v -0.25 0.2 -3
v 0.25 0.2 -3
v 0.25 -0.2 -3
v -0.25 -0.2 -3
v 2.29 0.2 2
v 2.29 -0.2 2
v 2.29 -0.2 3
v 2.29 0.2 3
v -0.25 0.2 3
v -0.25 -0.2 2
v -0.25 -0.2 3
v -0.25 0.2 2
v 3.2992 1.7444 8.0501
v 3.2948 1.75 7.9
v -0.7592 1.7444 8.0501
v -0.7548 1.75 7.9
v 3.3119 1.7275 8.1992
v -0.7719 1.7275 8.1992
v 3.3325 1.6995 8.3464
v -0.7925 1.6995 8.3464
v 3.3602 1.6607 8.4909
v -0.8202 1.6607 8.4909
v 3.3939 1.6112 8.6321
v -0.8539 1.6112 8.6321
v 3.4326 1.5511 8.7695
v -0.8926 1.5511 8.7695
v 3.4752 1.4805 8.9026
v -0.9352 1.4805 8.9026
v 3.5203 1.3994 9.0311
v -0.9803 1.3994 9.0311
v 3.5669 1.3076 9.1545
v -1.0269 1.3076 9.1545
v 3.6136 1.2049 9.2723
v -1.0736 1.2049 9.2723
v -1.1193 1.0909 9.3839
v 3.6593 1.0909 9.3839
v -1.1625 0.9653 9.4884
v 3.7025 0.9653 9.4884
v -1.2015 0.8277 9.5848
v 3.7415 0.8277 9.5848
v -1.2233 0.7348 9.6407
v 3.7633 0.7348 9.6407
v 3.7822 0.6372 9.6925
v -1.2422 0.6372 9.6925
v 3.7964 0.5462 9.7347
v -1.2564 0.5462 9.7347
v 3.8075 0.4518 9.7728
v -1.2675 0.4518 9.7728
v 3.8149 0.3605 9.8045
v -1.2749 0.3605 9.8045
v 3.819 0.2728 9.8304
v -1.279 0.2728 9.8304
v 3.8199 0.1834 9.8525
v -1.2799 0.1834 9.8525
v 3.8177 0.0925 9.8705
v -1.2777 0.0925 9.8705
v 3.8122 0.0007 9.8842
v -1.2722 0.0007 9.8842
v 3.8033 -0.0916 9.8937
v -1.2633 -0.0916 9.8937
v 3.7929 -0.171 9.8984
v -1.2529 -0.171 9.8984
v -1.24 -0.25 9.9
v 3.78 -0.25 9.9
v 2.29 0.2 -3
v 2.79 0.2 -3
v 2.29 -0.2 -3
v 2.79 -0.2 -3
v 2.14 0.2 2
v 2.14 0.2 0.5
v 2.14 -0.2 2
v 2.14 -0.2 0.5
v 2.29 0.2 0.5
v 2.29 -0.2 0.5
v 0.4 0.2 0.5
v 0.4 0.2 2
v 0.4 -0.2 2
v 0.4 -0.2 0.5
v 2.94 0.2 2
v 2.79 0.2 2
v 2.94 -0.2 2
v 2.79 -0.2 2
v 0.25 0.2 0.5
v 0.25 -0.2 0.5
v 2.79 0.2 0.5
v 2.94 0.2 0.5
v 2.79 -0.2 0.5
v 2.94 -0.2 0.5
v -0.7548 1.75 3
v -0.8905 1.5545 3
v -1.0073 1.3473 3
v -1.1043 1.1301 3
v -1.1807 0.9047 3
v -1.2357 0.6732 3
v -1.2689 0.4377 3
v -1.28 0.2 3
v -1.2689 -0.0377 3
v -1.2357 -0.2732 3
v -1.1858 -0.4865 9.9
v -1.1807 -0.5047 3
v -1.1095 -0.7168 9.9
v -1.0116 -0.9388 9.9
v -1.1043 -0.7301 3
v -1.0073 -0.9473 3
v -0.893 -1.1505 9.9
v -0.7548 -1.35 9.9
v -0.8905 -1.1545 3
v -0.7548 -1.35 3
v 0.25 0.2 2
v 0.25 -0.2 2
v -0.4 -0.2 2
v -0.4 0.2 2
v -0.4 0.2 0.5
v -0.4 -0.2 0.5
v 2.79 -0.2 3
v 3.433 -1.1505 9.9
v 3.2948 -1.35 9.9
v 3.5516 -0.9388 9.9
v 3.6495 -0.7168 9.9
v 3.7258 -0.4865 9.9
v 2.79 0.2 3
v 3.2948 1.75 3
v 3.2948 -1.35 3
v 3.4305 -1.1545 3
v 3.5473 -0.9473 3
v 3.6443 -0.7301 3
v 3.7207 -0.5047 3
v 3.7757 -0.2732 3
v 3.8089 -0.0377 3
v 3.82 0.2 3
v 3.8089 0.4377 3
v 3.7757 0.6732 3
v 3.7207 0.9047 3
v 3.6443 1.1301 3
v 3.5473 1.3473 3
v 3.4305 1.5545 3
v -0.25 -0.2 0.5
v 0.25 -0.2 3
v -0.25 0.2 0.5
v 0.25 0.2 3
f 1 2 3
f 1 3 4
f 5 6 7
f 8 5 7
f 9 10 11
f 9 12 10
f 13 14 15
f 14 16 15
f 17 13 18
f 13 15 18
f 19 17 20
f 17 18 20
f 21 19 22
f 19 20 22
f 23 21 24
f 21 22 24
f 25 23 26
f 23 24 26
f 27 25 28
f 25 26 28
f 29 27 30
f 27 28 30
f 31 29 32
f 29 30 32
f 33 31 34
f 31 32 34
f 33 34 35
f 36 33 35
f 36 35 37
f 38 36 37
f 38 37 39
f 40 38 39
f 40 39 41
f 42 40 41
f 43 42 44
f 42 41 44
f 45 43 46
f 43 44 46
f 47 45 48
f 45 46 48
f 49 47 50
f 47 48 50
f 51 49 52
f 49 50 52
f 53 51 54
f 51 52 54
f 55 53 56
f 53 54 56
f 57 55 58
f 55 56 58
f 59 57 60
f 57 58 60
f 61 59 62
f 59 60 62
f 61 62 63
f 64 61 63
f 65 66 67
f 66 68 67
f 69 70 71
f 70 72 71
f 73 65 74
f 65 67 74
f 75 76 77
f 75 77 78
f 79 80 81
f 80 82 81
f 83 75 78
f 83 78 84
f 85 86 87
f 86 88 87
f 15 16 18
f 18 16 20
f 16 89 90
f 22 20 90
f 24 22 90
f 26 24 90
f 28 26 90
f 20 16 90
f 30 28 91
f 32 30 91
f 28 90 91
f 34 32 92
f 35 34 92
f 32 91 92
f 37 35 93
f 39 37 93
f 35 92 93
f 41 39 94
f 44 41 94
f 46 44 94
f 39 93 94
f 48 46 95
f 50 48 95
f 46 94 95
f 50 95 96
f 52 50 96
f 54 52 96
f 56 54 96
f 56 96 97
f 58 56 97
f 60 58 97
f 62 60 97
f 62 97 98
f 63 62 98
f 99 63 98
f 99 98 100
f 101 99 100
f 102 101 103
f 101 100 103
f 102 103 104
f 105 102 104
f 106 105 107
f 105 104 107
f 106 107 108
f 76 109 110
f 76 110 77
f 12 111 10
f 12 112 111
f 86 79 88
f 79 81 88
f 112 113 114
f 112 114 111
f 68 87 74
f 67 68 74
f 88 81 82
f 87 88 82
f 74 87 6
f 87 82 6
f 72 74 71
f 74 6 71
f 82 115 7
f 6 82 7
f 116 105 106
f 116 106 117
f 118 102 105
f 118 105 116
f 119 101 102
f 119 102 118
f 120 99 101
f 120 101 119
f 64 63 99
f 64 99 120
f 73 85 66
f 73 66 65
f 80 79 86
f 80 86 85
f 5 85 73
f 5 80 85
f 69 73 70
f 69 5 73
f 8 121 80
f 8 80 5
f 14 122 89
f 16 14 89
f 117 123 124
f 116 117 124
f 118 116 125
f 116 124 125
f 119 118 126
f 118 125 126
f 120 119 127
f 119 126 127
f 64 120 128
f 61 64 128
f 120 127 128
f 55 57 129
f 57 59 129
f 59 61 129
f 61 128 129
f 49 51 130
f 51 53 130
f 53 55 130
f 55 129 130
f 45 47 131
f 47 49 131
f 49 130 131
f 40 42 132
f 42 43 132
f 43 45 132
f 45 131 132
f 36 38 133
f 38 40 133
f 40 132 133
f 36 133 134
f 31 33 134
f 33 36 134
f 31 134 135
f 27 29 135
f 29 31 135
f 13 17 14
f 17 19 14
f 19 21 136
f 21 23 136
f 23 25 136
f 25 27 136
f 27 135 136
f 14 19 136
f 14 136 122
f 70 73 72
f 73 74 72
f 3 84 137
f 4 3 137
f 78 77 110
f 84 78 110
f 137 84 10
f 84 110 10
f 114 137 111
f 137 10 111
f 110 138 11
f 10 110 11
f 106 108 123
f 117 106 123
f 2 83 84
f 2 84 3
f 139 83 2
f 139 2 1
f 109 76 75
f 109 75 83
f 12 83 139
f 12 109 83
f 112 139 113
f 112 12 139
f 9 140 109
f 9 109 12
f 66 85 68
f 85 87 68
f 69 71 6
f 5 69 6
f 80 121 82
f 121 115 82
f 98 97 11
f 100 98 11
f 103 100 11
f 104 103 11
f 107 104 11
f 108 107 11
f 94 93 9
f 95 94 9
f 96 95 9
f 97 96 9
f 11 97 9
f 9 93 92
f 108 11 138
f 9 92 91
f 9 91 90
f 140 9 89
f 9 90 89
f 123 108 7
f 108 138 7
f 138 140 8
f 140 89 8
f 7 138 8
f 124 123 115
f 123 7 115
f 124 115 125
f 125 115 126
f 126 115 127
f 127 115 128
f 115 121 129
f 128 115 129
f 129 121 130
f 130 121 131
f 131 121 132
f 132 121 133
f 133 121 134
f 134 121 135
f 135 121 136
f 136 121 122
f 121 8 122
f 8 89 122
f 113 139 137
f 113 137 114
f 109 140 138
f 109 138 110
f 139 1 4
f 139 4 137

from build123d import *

# Parameters (mm, degrees)
PAD001_DEPTH = 0.2
PAD_DEPTH    = 6.9
FILLET_R     = 2


with BuildPart() as pad001:
    # Sketch002 → Pad001 (new body, symmetric)
    with BuildSketch(Plane.XZ):
        Polygon((-0.25, 3), (0.25, 3), (0.25, 2), (0.4, 2), (0.4, 0.5), (0.25, 0.5), (0.25, -3), (-0.25, -3), (-0.25, 0.5), (-0.4, 0.5), (-0.4, 2), (-0.25, 2), align=None)
        Polygon((2.29, 3), (2.79, 3), (2.79, 2), (2.94, 2), (2.94, 0.5), (2.79, 0.5), (2.79, -3), (2.29, -3), (2.29, 0.5), (2.14, 0.5), (2.14, 2), (2.29, 2), align=None)
    extrude(amount=PAD001_DEPTH, both=True)


with BuildPart() as osram_sfh225:
    # Sketch → Pad (new body)
    with BuildSketch(Plane.XY.offset(3)):
        with BuildLine():
            Line((-0.754846, -1.35), (3.294846, -1.35))
            ThreePointArc((3.294846, -1.35), (3.82, 0.2), (3.294846, 1.75))
            Line((3.294846, 1.75), (-0.754846, 1.75))
            ThreePointArc((-0.754846, 1.75), (-1.28, 0.2), (-0.754846, -1.35))
        make_face()
    extrude(amount=PAD_DEPTH)

    # Fillet
    fillet_edges = [osram_sfh225.edges().sort_by_distance(p)[0] for p in [
        (1.27, 1.75, 9.9),
    ]]
    fillet(fillet_edges, radius=FILLET_R)

    # Fillet_mp_cp: union Pad001
    add(pad001.part)


solid = osram_sfh225.part
